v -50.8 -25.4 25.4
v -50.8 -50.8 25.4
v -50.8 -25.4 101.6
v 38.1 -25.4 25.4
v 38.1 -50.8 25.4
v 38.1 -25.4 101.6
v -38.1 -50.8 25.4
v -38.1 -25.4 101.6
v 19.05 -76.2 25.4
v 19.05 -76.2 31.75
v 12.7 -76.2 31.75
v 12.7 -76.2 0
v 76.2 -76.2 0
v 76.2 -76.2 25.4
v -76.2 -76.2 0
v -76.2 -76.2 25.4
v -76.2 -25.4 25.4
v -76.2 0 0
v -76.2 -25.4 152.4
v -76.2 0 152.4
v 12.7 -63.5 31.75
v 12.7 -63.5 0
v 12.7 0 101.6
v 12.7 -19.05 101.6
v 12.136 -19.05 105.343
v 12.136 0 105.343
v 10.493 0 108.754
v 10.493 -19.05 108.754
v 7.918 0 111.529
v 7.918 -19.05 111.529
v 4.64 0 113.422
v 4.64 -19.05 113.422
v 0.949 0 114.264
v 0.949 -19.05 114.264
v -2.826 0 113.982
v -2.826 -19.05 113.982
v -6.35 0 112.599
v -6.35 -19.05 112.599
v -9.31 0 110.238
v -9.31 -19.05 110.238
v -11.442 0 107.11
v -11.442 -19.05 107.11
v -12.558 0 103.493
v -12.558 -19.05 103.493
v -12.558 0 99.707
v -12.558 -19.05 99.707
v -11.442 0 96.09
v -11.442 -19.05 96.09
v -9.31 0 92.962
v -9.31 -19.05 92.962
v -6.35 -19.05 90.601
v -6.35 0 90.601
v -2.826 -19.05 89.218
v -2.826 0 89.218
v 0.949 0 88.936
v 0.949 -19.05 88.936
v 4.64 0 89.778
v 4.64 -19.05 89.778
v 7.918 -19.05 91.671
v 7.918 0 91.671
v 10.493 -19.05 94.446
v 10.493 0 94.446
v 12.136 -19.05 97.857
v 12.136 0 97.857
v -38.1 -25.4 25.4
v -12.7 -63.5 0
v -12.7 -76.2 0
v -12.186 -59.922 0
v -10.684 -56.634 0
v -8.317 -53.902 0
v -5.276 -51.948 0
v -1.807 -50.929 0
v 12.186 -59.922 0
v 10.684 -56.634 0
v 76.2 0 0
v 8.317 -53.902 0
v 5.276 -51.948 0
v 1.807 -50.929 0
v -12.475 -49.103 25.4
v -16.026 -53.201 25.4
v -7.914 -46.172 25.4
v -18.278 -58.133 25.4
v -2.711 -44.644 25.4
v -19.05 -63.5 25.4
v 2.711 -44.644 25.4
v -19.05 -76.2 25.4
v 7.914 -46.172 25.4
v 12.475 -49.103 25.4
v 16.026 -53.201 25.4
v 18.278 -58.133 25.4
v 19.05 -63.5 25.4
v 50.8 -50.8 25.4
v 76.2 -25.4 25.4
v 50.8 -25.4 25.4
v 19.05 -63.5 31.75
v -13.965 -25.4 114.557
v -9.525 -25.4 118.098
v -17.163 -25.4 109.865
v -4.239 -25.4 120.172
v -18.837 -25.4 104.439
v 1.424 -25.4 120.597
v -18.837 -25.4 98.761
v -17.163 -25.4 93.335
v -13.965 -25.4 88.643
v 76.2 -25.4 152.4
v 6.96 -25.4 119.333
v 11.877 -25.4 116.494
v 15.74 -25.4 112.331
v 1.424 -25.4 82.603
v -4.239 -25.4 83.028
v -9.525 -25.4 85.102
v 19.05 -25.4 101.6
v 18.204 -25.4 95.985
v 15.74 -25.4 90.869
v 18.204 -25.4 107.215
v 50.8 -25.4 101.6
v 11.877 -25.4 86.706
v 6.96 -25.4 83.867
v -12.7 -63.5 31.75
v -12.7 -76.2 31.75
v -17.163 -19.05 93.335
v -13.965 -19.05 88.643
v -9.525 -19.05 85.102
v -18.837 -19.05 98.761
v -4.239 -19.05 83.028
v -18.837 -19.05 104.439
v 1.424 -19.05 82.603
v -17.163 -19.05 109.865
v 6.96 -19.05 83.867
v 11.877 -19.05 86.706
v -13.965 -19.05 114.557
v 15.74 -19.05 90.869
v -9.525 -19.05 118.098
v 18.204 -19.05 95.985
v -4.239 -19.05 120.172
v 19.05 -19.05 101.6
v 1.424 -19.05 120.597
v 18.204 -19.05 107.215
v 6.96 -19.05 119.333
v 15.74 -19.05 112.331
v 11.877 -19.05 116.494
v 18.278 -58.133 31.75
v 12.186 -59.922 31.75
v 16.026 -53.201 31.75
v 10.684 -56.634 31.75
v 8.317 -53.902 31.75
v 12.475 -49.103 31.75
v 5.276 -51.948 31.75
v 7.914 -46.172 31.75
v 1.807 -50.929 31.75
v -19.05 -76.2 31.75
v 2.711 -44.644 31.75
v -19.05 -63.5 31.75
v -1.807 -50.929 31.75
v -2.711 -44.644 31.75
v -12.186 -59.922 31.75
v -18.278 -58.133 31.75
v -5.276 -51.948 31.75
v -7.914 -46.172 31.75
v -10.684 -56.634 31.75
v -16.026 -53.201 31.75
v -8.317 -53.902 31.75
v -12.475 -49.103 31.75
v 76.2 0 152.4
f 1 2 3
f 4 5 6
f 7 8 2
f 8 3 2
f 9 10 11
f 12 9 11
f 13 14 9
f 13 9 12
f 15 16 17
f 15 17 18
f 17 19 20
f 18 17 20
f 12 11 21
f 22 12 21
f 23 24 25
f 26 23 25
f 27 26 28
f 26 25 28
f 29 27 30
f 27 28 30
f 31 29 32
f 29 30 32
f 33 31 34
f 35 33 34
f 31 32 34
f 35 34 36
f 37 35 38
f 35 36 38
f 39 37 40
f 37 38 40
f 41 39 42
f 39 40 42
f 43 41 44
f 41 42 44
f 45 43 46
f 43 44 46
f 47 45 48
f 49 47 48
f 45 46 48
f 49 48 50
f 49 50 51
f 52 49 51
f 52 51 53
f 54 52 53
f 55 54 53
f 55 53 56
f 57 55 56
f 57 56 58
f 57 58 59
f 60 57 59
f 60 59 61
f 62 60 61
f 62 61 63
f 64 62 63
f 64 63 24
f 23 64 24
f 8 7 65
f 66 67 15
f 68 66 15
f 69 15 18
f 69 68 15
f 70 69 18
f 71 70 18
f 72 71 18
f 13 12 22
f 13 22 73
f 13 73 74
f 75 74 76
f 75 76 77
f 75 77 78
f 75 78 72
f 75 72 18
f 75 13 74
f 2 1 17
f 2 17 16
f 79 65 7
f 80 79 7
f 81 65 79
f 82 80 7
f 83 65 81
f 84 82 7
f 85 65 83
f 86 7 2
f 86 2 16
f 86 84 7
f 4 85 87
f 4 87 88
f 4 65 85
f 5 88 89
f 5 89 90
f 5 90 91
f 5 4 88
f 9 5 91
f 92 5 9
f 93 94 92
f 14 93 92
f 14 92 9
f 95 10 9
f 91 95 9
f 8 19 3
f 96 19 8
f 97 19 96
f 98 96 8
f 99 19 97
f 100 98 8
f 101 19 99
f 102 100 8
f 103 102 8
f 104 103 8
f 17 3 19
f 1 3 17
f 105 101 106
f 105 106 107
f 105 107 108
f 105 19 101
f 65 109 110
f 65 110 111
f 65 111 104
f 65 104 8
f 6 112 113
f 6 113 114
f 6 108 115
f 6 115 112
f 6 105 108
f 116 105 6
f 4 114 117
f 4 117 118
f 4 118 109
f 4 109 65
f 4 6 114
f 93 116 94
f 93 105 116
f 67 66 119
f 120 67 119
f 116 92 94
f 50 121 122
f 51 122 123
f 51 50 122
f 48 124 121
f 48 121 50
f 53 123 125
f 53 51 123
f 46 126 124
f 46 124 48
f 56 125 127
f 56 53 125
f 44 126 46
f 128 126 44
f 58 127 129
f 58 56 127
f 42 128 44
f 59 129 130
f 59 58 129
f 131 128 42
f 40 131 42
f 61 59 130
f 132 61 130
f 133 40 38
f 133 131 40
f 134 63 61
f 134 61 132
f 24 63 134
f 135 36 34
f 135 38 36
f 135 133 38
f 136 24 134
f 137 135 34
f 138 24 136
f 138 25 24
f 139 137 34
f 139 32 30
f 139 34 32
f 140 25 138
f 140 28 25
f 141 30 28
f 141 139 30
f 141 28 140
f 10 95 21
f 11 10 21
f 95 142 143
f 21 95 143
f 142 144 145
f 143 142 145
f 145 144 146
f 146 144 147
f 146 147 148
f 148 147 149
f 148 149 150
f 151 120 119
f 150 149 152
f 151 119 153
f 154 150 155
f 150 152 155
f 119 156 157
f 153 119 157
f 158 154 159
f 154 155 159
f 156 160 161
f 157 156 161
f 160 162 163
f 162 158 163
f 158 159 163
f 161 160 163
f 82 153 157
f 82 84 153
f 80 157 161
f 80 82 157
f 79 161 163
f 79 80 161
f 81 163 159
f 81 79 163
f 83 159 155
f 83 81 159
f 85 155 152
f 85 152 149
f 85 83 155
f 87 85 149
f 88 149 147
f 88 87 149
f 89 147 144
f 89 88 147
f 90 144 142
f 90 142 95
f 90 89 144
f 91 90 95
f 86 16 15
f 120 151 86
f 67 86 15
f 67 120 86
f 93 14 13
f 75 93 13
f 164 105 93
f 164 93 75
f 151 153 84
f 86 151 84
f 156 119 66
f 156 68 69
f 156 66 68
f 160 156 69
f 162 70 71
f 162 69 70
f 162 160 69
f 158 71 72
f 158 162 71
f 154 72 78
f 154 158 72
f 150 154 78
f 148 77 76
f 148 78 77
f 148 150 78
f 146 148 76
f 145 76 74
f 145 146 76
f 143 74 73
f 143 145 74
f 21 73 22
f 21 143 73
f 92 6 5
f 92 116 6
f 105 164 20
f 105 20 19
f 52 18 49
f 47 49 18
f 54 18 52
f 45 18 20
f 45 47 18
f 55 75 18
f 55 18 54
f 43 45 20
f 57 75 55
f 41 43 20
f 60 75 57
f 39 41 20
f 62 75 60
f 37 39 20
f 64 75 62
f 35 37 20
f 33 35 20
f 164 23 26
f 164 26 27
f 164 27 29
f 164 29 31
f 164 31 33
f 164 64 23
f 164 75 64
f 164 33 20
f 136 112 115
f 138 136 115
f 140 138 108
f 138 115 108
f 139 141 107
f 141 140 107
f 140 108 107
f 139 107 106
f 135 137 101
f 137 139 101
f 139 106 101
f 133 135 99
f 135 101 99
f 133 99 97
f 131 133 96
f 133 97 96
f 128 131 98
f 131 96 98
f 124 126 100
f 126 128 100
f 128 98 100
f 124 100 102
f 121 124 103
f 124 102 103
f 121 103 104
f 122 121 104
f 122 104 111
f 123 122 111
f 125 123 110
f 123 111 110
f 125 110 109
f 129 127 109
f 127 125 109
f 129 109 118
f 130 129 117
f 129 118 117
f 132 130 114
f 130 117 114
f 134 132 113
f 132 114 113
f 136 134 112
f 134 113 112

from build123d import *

# Parameters (mm, degrees)
F1_DEPTH = 76.2
F3_DEPTH = 25.401
F4_R     = 12.7
F5_DEPTH = 25.401
F4_R_2   = 19.05
F6_DEPTH = 6.35
F9_DEPTH = 6.35
F11_W    = 6.35
F11_H    = 6.35


with BuildPart() as f1:
    # F0 (on Right) → F1 (new body, symmetric)
    with BuildSketch(Plane.YZ):
        Polygon((-76.2, 0), (0, 0), (0, 152.4), (-25.4, 152.4), (-25.4, 25.4), (-76.2, 25.4), align=None)
    extrude(amount=F1_DEPTH, both=True)

    # F2 (on face) → F3 (cut, through all)
    with BuildSketch(Plane.XY.offset(25.4)):
        with BuildLine():
            Line((12.7, -76.2), (12.7, -63.5))
            ThreePointArc((12.7, -63.5), (0, -50.8), (-12.7, -63.5))
            Line((-12.7, -63.5), (-12.7, -76.2))
            Line((-12.7, -76.2), (12.7, -76.2))
        make_face()
    extrude(amount=-F3_DEPTH, mode=Mode.SUBTRACT)

    # F4 (on face) → F5 (cut, through all)
    with BuildSketch(Plane.XZ.offset(25.4)):
        with Locations((0, 101.6)):
            Circle(F4_R)
    extrude(amount=-F5_DEPTH, mode=Mode.SUBTRACT)

    # F4 (on face) → F6 (cut)
    with BuildSketch(Plane.XZ.offset(25.4)):
        with Locations((0, 101.6)):
            Circle(F4_R_2)
        with Locations((0, 101.6)):
            Circle(F4_R, mode=Mode.SUBTRACT)
    extrude(amount=-F6_DEPTH, mode=Mode.SUBTRACT)

    # F8 (on offset) → F9 (join, symmetric)
    with BuildSketch(Plane.YZ.offset(44.45)):
        Polygon((-50.8, 25.4), (-25.4, 25.4), (-25.4, 101.6), align=None)
    extrude(amount=F9_DEPTH, both=True)

    # F10: F1 across plane


with BuildPart() as f1_1:
    add(f1.part)
    add(f1.part.mirror(Plane.YZ))

    # F12: sweep along a path in F2
    with BuildLine(Plane.XY.offset(25.4)) as f12_path:
        Line((-12.7, -76.2), (-12.7, -63.5))
        ThreePointArc((-12.7, -63.5), (0, -50.8), (12.7, -63.5))
        Line((12.7, -63.5), (12.7, -76.2))
    # F11 (on face) → F12 (sweep)
    with BuildSketch(Plane.XZ.offset(76.2)):
        with Locations((-15.875, 28.575)):
            Rectangle(F11_W, F11_H)
    sweep(path=f12_path.line)


solid = f1_1.part
